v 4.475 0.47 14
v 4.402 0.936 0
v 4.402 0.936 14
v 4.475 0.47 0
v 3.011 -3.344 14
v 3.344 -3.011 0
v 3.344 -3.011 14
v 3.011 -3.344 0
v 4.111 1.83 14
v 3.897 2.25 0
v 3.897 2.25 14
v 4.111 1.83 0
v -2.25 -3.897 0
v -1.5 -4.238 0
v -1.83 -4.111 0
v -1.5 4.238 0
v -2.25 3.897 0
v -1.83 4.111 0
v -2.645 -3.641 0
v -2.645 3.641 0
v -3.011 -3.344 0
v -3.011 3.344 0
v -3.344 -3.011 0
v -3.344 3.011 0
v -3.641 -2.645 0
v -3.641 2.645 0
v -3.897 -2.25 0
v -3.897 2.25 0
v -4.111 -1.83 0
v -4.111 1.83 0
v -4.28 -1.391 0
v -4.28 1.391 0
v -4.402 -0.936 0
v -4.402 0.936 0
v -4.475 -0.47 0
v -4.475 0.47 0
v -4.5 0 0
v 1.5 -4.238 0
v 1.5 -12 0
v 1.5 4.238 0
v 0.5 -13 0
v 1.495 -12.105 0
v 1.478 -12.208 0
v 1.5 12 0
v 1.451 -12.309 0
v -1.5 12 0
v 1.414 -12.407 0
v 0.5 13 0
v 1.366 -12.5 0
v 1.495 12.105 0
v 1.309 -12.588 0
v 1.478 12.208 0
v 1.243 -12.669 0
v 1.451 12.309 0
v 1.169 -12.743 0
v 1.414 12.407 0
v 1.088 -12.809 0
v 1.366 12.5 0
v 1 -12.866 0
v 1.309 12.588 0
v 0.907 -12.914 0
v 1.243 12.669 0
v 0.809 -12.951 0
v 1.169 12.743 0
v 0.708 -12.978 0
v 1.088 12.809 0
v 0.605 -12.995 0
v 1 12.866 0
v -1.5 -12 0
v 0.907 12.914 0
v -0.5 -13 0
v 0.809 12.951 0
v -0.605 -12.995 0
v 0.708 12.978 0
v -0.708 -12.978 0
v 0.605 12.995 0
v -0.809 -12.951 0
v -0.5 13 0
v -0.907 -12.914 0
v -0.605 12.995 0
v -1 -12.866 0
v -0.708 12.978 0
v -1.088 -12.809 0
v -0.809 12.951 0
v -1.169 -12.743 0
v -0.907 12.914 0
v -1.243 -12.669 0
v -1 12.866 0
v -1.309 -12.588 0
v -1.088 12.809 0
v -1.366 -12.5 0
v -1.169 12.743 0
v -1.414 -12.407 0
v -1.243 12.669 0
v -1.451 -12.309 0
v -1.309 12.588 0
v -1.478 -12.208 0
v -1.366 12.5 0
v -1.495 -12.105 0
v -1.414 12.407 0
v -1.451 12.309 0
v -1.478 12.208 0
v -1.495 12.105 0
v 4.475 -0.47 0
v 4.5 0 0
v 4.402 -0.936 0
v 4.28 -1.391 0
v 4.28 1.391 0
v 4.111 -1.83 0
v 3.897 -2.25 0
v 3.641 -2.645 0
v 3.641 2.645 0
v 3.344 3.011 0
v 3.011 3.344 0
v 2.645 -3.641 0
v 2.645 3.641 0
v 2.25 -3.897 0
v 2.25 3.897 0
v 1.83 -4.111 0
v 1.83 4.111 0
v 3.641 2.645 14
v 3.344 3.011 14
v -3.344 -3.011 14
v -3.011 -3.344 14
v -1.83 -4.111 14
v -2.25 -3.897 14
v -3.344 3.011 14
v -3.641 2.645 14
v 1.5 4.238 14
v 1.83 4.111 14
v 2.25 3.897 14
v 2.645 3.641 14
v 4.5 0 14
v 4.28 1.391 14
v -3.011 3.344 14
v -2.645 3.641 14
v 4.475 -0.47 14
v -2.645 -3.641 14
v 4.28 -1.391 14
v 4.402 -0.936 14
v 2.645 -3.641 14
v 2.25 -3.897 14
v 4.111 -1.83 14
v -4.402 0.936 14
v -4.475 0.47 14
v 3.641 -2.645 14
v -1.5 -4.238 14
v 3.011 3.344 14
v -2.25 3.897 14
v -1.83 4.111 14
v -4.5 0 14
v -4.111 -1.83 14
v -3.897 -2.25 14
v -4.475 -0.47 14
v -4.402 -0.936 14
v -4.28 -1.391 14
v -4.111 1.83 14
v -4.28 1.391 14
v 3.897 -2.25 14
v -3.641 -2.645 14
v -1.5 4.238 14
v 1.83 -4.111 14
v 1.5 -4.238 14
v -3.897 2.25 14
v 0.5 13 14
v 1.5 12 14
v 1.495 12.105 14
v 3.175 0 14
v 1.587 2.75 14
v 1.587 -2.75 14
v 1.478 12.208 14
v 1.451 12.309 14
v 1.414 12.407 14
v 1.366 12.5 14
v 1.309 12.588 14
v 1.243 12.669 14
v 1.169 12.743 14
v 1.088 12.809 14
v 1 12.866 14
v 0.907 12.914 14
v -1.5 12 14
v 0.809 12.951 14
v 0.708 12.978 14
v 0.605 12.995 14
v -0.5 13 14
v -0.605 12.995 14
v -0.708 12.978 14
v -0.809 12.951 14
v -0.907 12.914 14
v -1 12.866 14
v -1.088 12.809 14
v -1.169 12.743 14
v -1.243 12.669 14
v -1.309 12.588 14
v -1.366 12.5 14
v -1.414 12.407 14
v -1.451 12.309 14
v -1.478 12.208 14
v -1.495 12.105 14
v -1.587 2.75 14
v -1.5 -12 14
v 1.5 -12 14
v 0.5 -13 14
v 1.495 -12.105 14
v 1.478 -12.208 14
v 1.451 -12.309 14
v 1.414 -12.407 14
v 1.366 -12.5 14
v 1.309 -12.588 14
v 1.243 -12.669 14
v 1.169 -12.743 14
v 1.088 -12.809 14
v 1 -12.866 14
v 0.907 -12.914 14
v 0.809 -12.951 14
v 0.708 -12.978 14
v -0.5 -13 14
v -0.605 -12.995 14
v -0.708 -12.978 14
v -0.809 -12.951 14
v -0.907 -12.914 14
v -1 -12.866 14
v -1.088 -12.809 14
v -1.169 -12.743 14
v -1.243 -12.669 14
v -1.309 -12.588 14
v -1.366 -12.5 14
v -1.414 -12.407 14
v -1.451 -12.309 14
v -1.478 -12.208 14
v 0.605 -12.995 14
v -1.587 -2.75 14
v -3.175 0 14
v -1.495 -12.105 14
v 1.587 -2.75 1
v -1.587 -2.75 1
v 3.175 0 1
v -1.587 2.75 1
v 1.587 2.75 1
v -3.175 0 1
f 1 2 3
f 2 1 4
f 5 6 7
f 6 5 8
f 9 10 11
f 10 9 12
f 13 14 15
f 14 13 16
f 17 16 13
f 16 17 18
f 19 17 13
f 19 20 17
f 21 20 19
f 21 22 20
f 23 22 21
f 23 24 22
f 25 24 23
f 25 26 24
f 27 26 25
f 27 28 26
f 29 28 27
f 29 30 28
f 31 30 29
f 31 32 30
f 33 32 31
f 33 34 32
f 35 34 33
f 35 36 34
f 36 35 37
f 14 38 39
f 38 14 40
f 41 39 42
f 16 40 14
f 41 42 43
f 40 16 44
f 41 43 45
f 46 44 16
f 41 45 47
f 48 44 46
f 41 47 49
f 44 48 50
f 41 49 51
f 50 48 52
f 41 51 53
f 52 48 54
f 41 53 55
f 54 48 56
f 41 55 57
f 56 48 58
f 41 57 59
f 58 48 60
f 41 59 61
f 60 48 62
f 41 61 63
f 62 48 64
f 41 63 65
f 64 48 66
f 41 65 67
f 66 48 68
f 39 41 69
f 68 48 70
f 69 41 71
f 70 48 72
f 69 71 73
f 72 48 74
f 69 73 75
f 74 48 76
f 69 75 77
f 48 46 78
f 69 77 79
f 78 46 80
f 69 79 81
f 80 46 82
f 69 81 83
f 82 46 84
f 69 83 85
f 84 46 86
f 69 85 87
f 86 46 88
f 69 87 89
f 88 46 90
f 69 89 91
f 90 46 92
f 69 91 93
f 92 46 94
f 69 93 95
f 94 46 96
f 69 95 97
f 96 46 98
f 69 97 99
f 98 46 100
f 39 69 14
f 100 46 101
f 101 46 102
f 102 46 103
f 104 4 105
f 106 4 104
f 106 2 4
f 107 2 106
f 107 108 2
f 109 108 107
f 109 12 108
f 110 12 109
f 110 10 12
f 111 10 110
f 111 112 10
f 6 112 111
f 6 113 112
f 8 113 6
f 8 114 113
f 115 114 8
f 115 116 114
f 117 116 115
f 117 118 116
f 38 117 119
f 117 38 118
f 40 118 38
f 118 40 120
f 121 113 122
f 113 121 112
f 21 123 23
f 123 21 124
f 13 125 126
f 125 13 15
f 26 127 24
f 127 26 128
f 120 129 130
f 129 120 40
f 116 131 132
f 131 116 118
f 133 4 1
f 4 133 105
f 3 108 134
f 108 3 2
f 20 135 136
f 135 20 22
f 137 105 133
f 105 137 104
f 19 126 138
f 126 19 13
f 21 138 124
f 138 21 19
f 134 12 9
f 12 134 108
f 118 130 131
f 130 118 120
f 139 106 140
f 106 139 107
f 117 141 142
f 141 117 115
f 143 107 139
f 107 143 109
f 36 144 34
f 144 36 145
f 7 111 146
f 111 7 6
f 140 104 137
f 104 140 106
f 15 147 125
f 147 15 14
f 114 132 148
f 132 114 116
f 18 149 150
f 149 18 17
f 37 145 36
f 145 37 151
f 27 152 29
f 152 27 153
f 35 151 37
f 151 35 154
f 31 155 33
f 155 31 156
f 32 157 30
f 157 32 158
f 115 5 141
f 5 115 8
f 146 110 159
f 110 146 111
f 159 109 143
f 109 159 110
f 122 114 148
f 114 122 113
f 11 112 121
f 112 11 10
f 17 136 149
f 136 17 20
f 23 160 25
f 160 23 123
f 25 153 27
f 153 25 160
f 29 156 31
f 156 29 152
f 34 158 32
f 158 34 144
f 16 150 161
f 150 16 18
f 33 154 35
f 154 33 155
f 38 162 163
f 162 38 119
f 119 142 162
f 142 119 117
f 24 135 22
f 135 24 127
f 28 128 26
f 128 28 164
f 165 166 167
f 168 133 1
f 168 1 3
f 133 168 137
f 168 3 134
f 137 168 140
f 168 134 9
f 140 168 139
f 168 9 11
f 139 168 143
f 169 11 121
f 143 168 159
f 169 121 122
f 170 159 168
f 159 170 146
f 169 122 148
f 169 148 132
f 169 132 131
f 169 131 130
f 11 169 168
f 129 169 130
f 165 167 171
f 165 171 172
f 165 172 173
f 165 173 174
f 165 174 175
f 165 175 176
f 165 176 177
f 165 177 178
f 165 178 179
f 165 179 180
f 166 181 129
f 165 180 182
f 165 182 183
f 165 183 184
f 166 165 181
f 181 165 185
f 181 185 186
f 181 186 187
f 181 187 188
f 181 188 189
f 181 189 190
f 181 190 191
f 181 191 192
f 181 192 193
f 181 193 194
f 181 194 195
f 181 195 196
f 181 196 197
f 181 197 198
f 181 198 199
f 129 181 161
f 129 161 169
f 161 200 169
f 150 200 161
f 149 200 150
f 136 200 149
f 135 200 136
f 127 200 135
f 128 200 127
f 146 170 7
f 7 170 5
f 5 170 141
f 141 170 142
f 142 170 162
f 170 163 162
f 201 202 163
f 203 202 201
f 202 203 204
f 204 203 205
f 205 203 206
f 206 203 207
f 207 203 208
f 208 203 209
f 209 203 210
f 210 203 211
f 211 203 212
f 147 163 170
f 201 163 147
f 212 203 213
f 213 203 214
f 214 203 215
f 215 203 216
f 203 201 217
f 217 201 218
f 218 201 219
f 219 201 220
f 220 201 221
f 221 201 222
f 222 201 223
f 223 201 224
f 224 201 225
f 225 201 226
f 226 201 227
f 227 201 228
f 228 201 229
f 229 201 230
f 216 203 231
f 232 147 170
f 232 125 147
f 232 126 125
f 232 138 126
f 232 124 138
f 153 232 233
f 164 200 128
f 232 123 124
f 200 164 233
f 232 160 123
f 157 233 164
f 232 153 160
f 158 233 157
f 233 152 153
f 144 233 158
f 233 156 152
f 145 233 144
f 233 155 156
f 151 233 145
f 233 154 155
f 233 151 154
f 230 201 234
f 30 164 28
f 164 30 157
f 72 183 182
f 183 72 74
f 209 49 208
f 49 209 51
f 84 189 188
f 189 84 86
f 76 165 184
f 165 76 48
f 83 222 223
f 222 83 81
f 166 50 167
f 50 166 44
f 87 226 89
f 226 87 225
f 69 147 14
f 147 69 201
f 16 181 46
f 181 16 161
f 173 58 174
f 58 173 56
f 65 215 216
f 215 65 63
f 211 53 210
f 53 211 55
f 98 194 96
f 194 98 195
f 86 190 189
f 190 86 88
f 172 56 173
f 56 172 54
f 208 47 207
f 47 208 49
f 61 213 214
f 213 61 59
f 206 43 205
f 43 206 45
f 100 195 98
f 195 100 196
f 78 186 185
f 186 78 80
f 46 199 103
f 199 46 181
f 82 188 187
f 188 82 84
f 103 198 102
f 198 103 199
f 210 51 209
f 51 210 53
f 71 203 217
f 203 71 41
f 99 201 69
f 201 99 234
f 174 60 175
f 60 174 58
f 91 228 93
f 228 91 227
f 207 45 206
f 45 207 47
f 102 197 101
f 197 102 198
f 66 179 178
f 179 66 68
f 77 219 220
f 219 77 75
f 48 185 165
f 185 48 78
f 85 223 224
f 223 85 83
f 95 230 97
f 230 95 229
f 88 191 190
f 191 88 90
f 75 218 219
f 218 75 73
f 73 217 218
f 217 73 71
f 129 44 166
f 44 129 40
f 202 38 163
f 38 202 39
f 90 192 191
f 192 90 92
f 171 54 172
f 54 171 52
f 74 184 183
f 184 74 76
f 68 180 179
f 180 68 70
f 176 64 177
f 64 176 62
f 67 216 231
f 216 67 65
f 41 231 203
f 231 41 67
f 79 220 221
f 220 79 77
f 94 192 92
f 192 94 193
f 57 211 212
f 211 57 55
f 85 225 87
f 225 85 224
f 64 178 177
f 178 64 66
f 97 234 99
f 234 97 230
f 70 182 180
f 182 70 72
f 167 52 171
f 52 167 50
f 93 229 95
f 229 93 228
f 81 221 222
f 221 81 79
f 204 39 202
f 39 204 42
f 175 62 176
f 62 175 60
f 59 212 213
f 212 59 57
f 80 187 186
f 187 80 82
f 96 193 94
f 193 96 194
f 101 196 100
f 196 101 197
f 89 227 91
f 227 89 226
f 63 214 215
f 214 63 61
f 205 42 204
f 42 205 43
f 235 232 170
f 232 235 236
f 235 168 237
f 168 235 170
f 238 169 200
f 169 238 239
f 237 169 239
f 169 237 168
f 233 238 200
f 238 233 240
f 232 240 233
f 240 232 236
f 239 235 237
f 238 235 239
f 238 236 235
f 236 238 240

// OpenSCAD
// Olaf
$fn=60;
translate([0,0,7])
{
  difference()
  {
    union()
    {
      cylinder(h=14,d=9,center = true);
      minkowski() {
        cube([1,24,13], center = true);
        cylinder([2,2,1], center = true);
      }
    }
    cylinder($fn=6,h=16,d=6.35,center = true);
    }
}

//Uwe: close from the bottom
translate([0,0,0.5]){
cylinder($fn=6,h=1,d=6.6,center = true);
} 
